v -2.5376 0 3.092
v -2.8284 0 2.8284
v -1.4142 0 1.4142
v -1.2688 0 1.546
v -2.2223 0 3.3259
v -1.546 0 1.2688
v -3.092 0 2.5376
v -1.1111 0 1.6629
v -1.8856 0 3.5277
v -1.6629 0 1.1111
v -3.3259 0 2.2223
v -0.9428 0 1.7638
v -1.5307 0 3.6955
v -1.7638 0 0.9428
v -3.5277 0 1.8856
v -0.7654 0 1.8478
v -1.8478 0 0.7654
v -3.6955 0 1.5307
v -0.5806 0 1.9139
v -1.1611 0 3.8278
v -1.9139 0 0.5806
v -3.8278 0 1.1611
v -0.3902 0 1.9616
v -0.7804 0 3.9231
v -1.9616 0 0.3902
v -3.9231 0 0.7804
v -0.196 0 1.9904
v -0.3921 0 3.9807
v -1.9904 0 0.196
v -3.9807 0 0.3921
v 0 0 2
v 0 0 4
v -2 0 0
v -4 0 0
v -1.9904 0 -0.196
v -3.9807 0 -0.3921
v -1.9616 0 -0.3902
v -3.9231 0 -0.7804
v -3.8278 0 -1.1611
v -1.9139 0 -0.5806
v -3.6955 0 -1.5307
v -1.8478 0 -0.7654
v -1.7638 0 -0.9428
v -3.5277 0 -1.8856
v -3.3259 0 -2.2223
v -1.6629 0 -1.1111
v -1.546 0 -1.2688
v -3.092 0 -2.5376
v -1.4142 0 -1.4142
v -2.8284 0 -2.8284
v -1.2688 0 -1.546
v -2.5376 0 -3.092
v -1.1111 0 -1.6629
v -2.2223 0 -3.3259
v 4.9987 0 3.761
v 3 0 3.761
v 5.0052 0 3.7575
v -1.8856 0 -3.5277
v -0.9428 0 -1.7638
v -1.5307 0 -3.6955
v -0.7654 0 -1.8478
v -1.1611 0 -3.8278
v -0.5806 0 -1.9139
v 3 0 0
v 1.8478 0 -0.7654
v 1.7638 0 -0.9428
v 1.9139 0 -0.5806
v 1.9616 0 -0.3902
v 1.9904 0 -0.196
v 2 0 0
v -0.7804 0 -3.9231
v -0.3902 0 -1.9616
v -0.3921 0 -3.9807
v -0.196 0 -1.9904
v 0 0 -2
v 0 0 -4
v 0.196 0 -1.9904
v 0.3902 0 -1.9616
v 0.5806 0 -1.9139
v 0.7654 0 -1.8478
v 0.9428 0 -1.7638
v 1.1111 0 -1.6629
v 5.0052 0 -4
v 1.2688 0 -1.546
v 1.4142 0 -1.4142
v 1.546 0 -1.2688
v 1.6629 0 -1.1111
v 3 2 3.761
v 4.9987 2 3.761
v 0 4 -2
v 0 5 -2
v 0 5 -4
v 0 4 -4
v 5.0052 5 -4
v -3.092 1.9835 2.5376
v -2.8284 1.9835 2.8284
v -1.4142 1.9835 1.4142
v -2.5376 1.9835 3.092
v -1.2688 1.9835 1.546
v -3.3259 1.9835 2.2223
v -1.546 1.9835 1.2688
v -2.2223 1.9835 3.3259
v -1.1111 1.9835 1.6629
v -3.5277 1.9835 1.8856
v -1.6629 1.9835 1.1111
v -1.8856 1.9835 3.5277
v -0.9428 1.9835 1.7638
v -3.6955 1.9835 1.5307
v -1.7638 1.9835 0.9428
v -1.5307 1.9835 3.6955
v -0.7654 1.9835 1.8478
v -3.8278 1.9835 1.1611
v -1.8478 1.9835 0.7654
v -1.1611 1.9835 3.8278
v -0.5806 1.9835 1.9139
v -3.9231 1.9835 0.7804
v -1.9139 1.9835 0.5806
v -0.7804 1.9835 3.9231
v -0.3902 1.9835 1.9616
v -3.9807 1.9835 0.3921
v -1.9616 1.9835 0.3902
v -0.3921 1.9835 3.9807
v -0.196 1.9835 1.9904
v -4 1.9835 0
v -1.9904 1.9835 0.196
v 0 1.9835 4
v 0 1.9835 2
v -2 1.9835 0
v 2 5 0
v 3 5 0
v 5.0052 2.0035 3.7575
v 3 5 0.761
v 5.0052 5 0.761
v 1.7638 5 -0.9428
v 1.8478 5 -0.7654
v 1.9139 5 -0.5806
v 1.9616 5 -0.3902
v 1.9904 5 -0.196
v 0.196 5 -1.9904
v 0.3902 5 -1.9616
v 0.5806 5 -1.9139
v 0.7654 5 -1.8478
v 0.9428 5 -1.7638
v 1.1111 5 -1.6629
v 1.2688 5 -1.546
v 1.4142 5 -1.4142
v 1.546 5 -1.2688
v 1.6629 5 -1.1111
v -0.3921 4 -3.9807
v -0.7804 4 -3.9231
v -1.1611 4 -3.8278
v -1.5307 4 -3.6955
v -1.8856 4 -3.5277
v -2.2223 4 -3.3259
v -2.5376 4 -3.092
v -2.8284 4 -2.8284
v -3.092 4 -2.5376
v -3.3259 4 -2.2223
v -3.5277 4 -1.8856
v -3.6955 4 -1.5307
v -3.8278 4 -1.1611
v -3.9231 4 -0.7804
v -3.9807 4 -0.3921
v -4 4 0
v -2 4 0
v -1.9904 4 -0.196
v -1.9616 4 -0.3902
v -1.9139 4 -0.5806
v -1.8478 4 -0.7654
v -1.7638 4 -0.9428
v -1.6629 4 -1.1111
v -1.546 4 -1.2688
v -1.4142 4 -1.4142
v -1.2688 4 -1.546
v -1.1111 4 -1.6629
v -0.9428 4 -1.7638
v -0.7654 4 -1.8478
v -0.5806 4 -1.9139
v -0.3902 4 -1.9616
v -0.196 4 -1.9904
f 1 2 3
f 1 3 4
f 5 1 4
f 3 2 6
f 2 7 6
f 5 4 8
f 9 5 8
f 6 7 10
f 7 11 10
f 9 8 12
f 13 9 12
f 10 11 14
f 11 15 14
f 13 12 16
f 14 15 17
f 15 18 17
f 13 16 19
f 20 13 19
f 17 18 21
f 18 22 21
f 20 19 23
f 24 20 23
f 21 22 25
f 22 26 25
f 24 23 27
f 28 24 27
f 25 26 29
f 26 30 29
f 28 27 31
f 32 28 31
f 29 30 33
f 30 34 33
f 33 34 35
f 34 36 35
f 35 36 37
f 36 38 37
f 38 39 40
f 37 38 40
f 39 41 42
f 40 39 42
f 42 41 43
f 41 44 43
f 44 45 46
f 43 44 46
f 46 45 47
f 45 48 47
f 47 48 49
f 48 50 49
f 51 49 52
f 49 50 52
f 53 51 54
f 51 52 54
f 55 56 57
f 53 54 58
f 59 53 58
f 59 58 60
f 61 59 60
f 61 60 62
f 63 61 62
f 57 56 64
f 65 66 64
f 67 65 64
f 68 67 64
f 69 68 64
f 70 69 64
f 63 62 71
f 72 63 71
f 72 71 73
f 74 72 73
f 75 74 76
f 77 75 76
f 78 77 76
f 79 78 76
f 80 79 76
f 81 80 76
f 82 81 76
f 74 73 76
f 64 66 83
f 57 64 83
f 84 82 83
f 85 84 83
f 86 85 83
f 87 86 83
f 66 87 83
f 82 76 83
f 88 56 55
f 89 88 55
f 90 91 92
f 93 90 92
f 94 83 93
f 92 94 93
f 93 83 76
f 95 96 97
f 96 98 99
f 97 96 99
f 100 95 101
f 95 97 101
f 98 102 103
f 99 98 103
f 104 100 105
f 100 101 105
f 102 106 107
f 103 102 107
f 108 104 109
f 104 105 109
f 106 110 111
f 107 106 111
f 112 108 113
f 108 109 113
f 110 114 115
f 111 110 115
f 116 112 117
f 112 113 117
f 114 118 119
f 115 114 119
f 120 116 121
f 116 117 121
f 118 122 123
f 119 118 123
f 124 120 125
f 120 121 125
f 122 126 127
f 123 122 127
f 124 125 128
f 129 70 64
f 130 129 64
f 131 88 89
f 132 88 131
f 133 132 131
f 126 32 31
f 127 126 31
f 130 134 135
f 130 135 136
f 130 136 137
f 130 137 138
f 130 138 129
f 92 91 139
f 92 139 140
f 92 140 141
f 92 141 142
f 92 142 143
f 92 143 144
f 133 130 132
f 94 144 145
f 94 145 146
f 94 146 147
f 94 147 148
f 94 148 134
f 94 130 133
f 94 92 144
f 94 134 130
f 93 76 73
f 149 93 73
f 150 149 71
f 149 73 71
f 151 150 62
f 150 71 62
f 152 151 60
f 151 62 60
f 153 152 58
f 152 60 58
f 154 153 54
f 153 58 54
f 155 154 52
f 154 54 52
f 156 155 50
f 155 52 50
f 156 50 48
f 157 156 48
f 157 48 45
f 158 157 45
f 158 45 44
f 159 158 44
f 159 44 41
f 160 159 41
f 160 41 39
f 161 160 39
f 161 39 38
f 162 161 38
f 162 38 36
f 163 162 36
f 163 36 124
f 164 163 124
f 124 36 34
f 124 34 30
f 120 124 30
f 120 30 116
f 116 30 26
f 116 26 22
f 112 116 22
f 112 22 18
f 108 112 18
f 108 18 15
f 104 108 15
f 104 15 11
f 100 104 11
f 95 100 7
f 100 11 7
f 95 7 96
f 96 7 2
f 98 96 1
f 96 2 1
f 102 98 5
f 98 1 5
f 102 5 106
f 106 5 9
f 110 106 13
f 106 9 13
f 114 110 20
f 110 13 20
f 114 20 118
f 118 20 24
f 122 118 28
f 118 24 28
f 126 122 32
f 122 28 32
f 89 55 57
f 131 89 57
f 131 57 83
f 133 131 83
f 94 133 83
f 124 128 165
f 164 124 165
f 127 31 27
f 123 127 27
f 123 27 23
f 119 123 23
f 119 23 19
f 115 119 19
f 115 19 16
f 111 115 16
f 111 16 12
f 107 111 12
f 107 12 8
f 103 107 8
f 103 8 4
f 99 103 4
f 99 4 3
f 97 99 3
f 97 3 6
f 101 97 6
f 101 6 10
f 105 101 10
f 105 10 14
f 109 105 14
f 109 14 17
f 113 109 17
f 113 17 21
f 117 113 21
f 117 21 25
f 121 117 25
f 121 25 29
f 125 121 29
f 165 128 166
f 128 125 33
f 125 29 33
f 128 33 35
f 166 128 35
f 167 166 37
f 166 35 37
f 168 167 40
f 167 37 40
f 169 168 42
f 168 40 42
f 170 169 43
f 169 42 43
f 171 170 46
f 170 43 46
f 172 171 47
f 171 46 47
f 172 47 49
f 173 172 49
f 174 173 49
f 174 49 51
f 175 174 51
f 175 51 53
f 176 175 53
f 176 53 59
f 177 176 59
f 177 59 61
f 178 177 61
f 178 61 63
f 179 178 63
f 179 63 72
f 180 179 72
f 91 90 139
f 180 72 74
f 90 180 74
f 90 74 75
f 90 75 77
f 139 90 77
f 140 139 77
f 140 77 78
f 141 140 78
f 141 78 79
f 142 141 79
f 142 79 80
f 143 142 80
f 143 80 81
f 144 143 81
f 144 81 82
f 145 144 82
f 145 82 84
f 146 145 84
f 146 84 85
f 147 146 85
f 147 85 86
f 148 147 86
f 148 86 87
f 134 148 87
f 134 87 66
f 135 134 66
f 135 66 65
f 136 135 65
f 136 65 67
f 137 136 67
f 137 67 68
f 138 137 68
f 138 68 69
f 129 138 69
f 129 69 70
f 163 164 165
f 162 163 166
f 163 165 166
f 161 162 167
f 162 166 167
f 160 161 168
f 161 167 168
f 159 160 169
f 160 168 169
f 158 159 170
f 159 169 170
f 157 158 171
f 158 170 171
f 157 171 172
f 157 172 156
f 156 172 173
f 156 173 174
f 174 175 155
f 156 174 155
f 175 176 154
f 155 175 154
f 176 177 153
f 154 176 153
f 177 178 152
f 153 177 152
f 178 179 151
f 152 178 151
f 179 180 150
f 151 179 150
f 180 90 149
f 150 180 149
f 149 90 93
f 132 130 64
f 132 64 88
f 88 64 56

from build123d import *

# Parameters (mm, degrees)
BOSS_EXTRUDE1_DEPTH = 5
CUT_EXTRUDE1_DEPTH  = 5
CHAMFER1_SIZE       = 3


with BuildPart() as part:
    # Sketch1 → Boss-Extrude1 (new body)
    with BuildSketch(Plane(origin=(0, 0, 0), x_dir=(1, 0, 0), z_dir=(0, 1, 0))):
        with BuildLine():
            Line((0, -4), (0, -2))
            ThreePointArc((0, -2), (-1.414213562, 1.414213562), (2, 0))
            Line((2, 0), (3, 0))
            Line((3, 0), (3, -3.760972677))
            Line((3, -3.760972677), (4.998650065, -3.760972677))
            Line((4.998650065, -3.760972677), (5.005216321, -3.757452983))
            Line((5.005216321, -3.757452983), (5.005216321, 4))
            Line((5.005216321, 4), (0, 4))
            ThreePointArc((0, 4), (-4, 0), (0, -4))
        make_face()
    extrude(amount=BOSS_EXTRUDE1_DEPTH)

    # Sketch2 → Cut-Extrude1 (cut)
    with BuildSketch(Plane(origin=(0, 0, 0), x_dir=(0, 0, -1), z_dir=(1, 0, 0))):
        Polygon((4, 5), (0, 5), (0, 4.983533527), (-4, 4.983533527), (-4, 1.983533527), (0, 1.983533527), (0, 4), (4, 4), align=None)
    extrude(amount=-CUT_EXTRUDE1_DEPTH, mode=Mode.SUBTRACT)


with BuildPart() as cut_extrude1_kept_piece:
    # of the separate pieces the step leaves, the one the design keeps (cut_extrude1_pieces_kept)
    add(part.part.solids().sort_by_distance((0, 0, 4))[0])

    # Chamfer1
    chamfer1_edges = [cut_extrude1_kept_piece.edges().sort_by_distance(p)[0] for p in [
        (3.999325033, 5, 3.760972677),
    ]]
    chamfer(chamfer1_edges, length=CHAMFER1_SIZE)


solid = cut_extrude1_kept_piece.part
